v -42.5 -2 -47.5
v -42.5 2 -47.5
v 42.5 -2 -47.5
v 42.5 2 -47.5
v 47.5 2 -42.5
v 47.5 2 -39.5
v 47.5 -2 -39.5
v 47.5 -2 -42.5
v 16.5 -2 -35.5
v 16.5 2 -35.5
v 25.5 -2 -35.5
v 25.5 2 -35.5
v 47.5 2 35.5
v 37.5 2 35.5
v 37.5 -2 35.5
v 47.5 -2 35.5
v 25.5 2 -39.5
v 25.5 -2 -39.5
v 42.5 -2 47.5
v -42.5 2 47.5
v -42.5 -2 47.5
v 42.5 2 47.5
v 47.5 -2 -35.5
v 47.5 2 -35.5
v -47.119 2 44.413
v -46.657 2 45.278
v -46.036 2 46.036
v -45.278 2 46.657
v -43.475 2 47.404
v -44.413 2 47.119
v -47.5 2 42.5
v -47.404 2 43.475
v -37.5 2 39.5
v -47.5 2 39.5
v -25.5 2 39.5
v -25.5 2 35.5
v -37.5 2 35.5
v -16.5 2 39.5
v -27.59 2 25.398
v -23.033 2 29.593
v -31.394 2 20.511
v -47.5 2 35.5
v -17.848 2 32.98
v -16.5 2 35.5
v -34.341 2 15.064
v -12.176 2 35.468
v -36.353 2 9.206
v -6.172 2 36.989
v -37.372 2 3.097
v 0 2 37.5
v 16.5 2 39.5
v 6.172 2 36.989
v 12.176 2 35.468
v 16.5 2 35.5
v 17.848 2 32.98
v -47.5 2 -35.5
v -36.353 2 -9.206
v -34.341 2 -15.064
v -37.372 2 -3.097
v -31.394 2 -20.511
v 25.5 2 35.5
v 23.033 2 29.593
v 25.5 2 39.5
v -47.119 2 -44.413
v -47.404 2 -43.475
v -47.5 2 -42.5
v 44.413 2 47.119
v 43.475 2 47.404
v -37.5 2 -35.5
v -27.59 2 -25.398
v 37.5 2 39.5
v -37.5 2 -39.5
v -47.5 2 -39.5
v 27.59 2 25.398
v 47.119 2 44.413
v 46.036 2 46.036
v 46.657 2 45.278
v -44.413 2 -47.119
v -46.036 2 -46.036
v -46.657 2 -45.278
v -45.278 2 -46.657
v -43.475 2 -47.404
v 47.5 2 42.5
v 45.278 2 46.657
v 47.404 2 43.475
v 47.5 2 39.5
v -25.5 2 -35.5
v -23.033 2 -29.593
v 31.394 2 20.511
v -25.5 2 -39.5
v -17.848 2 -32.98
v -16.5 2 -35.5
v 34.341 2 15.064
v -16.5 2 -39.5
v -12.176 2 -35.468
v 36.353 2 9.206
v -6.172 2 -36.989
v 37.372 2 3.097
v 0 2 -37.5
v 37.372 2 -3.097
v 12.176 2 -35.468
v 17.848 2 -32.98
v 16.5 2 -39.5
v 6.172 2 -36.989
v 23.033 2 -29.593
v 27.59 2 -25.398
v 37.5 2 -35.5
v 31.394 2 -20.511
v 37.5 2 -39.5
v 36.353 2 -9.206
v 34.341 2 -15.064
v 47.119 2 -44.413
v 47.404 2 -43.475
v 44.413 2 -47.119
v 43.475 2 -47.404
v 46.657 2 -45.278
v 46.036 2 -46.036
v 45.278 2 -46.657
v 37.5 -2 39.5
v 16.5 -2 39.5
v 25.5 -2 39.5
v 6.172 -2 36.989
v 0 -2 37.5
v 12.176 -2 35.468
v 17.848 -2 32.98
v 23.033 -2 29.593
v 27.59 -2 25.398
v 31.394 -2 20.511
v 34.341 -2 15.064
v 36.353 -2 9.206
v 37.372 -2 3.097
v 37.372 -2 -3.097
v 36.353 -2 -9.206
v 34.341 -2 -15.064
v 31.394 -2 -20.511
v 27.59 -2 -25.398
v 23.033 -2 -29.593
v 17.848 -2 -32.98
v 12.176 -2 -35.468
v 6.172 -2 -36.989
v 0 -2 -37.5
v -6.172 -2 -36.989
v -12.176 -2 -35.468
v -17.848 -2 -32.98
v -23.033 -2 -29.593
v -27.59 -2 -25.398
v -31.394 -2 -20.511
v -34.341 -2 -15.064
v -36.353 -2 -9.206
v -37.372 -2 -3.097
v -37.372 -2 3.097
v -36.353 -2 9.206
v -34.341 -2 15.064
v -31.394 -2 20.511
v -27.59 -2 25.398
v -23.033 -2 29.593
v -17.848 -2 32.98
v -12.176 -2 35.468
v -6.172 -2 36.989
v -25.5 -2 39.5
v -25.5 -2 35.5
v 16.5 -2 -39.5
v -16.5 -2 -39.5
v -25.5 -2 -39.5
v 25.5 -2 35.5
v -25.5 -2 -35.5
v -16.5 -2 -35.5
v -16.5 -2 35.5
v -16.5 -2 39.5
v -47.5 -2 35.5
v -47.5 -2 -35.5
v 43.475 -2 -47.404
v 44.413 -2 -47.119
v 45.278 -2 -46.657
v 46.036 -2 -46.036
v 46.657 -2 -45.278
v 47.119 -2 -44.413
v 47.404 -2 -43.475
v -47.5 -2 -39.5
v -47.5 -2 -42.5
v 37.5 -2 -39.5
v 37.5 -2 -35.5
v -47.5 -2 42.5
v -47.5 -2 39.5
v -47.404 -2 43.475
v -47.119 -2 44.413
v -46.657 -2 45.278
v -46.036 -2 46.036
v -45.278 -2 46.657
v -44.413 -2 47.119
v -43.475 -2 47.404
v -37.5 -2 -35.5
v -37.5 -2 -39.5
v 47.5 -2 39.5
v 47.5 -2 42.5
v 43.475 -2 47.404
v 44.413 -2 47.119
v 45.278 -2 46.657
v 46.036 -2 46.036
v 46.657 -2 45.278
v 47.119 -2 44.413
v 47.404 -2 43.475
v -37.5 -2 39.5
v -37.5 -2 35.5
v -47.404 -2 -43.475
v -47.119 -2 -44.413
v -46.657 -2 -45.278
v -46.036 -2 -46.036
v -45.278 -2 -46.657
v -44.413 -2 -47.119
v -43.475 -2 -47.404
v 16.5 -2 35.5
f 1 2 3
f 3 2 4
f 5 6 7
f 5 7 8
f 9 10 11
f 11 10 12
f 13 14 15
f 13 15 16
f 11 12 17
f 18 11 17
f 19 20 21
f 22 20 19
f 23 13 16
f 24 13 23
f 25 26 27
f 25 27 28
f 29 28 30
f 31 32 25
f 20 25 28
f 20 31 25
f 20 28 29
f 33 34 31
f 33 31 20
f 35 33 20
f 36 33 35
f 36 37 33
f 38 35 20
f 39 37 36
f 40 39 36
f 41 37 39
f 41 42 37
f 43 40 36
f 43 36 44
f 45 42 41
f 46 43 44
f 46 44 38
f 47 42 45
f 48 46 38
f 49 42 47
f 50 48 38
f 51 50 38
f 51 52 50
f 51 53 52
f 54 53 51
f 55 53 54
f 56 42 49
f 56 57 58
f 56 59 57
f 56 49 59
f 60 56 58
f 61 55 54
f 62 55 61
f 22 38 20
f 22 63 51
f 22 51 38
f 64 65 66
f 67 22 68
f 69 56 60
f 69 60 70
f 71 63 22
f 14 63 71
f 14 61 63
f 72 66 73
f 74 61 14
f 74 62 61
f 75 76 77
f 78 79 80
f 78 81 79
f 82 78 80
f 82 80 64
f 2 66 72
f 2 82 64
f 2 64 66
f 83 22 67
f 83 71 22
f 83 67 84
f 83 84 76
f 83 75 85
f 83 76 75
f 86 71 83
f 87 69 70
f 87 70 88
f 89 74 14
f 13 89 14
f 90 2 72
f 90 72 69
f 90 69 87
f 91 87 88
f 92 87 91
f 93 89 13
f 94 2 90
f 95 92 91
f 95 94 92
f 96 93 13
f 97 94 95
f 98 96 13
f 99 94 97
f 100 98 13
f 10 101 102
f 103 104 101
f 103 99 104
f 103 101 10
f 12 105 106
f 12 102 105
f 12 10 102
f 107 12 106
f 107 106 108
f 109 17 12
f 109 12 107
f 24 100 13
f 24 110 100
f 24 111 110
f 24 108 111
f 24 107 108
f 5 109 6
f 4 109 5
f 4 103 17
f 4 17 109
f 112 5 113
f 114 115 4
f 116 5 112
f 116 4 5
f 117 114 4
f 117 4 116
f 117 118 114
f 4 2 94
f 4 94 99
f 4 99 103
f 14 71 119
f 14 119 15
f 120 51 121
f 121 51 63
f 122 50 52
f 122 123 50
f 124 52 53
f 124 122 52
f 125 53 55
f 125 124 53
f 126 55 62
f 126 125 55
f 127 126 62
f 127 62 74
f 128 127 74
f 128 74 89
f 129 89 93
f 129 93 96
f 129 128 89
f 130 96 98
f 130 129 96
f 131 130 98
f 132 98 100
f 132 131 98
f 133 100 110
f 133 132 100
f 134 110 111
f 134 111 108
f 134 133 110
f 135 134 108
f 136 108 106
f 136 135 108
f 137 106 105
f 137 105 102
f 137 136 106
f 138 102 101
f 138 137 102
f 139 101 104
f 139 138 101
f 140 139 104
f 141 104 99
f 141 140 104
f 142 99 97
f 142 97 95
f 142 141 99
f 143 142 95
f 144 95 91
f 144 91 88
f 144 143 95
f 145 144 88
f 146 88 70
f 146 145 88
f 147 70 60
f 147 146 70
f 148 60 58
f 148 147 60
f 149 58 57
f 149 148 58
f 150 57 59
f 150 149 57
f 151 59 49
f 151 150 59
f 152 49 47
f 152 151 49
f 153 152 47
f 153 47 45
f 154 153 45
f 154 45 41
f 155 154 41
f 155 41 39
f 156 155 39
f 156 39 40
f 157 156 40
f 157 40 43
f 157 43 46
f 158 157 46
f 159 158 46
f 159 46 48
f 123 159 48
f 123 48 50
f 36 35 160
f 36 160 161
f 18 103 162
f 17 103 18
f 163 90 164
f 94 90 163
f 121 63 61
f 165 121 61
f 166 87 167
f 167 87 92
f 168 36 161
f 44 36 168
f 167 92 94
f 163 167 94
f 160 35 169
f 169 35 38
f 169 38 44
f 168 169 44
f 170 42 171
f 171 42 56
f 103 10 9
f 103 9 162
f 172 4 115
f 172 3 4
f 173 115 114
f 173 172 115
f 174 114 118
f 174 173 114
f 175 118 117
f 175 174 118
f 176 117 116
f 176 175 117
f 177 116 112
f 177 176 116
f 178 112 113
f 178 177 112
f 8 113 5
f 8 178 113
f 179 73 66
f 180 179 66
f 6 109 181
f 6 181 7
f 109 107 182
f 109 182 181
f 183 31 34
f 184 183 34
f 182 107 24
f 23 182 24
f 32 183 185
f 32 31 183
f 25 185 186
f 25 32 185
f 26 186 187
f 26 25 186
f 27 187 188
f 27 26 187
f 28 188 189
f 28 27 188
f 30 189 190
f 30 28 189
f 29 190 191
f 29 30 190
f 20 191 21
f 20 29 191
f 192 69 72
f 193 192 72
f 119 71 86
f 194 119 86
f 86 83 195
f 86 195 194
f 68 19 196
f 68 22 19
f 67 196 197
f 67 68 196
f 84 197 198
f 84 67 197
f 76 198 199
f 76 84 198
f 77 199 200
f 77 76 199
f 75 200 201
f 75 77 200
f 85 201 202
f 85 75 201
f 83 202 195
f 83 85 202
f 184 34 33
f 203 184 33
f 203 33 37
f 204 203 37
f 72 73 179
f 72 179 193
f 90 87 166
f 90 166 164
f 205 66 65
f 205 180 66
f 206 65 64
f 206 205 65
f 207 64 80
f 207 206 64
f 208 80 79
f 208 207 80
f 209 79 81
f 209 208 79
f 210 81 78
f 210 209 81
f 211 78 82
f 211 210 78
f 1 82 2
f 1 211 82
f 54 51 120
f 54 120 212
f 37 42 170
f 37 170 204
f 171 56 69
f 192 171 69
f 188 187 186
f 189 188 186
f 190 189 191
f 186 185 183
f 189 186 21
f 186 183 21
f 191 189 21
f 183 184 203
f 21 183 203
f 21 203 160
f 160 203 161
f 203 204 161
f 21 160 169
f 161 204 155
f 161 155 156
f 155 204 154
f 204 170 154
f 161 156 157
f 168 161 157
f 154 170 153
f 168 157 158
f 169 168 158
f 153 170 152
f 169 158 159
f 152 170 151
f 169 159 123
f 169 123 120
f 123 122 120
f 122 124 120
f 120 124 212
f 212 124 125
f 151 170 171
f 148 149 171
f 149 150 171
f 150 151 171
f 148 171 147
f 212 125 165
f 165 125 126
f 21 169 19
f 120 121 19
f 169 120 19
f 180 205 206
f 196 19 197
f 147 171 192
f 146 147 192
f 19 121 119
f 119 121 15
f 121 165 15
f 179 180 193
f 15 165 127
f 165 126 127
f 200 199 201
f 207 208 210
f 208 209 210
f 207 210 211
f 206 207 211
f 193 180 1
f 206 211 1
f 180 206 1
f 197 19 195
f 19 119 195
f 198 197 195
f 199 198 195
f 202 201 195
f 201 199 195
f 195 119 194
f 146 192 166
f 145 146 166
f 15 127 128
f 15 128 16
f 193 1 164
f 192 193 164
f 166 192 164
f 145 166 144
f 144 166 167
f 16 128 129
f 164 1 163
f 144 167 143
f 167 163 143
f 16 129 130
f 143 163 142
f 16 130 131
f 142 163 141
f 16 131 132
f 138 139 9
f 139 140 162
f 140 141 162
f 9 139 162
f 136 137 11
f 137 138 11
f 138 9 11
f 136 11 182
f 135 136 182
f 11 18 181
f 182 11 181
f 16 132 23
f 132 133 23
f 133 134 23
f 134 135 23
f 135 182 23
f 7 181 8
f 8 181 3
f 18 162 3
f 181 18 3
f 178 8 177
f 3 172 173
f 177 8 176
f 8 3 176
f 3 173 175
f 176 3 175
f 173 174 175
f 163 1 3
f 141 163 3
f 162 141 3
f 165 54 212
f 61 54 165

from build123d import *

# Parameters (mm, degrees)
SKETCH1_W           = 95
SKETCH1_H           = 95
SKETCH1_R           = 37.5
BOSS_EXTRUDE1_DEPTH = 2
SKETCH3_W           = 10
SKETCH3_H           = 4
SKETCH3_W_2         = 9
CUT_EXTRUDE5_DEPTH  = 68.294130502
FILLET1_R           = 5


with BuildPart() as part:
    # Sketch1 → Boss-Extrude1 (new, symmetric)
    with BuildSketch(Plane(origin=(0, 0, 0), x_dir=(1, 0, 0), z_dir=(0, 1, 0))):
        Rectangle(SKETCH1_W, SKETCH1_H)
        Circle(SKETCH1_R, mode=Mode.SUBTRACT)
    extrude(amount=BOSS_EXTRUDE1_DEPTH, both=True)

    # Sketch3 → Cut-Extrude5 (cut, through all)
    with BuildSketch(Plane(origin=(0, 2, 0), x_dir=(1, 0, 0), z_dir=(0, 1, 0))):
        with Locations((-42.5, -37.5)):
            Rectangle(SKETCH3_W, SKETCH3_H)
        with Locations((-42.5, 37.5)):
            Rectangle(SKETCH3_W, SKETCH3_H)
        with Locations((21, 37.5)):
            Rectangle(SKETCH3_W_2, SKETCH3_H)
        with Locations((42.5, -37.5)):
            Rectangle(SKETCH3_W, SKETCH3_H)
        with Locations((42.5, 37.5)):
            Rectangle(SKETCH3_W, SKETCH3_H)
        with Locations((21, -37.5)):
            Rectangle(SKETCH3_W_2, SKETCH3_H)
        with Locations((-21, -37.5)):
            Rectangle(SKETCH3_W_2, SKETCH3_H)
        with Locations((-21, 37.5)):
            Rectangle(SKETCH3_W_2, SKETCH3_H)
    extrude(amount=-CUT_EXTRUDE5_DEPTH, mode=Mode.SUBTRACT)

    # Fillet1
    fillet1_edges = [part.edges().sort_by_distance(p)[0] for p in [
        (-47.5, 0, 47.5),
        (47.5, 0, 47.5),
        (47.5, 0, -47.5),
        (-47.5, 0, -47.5),
    ]]
    fillet(fillet1_edges, radius=FILLET1_R)


solid = part.part
